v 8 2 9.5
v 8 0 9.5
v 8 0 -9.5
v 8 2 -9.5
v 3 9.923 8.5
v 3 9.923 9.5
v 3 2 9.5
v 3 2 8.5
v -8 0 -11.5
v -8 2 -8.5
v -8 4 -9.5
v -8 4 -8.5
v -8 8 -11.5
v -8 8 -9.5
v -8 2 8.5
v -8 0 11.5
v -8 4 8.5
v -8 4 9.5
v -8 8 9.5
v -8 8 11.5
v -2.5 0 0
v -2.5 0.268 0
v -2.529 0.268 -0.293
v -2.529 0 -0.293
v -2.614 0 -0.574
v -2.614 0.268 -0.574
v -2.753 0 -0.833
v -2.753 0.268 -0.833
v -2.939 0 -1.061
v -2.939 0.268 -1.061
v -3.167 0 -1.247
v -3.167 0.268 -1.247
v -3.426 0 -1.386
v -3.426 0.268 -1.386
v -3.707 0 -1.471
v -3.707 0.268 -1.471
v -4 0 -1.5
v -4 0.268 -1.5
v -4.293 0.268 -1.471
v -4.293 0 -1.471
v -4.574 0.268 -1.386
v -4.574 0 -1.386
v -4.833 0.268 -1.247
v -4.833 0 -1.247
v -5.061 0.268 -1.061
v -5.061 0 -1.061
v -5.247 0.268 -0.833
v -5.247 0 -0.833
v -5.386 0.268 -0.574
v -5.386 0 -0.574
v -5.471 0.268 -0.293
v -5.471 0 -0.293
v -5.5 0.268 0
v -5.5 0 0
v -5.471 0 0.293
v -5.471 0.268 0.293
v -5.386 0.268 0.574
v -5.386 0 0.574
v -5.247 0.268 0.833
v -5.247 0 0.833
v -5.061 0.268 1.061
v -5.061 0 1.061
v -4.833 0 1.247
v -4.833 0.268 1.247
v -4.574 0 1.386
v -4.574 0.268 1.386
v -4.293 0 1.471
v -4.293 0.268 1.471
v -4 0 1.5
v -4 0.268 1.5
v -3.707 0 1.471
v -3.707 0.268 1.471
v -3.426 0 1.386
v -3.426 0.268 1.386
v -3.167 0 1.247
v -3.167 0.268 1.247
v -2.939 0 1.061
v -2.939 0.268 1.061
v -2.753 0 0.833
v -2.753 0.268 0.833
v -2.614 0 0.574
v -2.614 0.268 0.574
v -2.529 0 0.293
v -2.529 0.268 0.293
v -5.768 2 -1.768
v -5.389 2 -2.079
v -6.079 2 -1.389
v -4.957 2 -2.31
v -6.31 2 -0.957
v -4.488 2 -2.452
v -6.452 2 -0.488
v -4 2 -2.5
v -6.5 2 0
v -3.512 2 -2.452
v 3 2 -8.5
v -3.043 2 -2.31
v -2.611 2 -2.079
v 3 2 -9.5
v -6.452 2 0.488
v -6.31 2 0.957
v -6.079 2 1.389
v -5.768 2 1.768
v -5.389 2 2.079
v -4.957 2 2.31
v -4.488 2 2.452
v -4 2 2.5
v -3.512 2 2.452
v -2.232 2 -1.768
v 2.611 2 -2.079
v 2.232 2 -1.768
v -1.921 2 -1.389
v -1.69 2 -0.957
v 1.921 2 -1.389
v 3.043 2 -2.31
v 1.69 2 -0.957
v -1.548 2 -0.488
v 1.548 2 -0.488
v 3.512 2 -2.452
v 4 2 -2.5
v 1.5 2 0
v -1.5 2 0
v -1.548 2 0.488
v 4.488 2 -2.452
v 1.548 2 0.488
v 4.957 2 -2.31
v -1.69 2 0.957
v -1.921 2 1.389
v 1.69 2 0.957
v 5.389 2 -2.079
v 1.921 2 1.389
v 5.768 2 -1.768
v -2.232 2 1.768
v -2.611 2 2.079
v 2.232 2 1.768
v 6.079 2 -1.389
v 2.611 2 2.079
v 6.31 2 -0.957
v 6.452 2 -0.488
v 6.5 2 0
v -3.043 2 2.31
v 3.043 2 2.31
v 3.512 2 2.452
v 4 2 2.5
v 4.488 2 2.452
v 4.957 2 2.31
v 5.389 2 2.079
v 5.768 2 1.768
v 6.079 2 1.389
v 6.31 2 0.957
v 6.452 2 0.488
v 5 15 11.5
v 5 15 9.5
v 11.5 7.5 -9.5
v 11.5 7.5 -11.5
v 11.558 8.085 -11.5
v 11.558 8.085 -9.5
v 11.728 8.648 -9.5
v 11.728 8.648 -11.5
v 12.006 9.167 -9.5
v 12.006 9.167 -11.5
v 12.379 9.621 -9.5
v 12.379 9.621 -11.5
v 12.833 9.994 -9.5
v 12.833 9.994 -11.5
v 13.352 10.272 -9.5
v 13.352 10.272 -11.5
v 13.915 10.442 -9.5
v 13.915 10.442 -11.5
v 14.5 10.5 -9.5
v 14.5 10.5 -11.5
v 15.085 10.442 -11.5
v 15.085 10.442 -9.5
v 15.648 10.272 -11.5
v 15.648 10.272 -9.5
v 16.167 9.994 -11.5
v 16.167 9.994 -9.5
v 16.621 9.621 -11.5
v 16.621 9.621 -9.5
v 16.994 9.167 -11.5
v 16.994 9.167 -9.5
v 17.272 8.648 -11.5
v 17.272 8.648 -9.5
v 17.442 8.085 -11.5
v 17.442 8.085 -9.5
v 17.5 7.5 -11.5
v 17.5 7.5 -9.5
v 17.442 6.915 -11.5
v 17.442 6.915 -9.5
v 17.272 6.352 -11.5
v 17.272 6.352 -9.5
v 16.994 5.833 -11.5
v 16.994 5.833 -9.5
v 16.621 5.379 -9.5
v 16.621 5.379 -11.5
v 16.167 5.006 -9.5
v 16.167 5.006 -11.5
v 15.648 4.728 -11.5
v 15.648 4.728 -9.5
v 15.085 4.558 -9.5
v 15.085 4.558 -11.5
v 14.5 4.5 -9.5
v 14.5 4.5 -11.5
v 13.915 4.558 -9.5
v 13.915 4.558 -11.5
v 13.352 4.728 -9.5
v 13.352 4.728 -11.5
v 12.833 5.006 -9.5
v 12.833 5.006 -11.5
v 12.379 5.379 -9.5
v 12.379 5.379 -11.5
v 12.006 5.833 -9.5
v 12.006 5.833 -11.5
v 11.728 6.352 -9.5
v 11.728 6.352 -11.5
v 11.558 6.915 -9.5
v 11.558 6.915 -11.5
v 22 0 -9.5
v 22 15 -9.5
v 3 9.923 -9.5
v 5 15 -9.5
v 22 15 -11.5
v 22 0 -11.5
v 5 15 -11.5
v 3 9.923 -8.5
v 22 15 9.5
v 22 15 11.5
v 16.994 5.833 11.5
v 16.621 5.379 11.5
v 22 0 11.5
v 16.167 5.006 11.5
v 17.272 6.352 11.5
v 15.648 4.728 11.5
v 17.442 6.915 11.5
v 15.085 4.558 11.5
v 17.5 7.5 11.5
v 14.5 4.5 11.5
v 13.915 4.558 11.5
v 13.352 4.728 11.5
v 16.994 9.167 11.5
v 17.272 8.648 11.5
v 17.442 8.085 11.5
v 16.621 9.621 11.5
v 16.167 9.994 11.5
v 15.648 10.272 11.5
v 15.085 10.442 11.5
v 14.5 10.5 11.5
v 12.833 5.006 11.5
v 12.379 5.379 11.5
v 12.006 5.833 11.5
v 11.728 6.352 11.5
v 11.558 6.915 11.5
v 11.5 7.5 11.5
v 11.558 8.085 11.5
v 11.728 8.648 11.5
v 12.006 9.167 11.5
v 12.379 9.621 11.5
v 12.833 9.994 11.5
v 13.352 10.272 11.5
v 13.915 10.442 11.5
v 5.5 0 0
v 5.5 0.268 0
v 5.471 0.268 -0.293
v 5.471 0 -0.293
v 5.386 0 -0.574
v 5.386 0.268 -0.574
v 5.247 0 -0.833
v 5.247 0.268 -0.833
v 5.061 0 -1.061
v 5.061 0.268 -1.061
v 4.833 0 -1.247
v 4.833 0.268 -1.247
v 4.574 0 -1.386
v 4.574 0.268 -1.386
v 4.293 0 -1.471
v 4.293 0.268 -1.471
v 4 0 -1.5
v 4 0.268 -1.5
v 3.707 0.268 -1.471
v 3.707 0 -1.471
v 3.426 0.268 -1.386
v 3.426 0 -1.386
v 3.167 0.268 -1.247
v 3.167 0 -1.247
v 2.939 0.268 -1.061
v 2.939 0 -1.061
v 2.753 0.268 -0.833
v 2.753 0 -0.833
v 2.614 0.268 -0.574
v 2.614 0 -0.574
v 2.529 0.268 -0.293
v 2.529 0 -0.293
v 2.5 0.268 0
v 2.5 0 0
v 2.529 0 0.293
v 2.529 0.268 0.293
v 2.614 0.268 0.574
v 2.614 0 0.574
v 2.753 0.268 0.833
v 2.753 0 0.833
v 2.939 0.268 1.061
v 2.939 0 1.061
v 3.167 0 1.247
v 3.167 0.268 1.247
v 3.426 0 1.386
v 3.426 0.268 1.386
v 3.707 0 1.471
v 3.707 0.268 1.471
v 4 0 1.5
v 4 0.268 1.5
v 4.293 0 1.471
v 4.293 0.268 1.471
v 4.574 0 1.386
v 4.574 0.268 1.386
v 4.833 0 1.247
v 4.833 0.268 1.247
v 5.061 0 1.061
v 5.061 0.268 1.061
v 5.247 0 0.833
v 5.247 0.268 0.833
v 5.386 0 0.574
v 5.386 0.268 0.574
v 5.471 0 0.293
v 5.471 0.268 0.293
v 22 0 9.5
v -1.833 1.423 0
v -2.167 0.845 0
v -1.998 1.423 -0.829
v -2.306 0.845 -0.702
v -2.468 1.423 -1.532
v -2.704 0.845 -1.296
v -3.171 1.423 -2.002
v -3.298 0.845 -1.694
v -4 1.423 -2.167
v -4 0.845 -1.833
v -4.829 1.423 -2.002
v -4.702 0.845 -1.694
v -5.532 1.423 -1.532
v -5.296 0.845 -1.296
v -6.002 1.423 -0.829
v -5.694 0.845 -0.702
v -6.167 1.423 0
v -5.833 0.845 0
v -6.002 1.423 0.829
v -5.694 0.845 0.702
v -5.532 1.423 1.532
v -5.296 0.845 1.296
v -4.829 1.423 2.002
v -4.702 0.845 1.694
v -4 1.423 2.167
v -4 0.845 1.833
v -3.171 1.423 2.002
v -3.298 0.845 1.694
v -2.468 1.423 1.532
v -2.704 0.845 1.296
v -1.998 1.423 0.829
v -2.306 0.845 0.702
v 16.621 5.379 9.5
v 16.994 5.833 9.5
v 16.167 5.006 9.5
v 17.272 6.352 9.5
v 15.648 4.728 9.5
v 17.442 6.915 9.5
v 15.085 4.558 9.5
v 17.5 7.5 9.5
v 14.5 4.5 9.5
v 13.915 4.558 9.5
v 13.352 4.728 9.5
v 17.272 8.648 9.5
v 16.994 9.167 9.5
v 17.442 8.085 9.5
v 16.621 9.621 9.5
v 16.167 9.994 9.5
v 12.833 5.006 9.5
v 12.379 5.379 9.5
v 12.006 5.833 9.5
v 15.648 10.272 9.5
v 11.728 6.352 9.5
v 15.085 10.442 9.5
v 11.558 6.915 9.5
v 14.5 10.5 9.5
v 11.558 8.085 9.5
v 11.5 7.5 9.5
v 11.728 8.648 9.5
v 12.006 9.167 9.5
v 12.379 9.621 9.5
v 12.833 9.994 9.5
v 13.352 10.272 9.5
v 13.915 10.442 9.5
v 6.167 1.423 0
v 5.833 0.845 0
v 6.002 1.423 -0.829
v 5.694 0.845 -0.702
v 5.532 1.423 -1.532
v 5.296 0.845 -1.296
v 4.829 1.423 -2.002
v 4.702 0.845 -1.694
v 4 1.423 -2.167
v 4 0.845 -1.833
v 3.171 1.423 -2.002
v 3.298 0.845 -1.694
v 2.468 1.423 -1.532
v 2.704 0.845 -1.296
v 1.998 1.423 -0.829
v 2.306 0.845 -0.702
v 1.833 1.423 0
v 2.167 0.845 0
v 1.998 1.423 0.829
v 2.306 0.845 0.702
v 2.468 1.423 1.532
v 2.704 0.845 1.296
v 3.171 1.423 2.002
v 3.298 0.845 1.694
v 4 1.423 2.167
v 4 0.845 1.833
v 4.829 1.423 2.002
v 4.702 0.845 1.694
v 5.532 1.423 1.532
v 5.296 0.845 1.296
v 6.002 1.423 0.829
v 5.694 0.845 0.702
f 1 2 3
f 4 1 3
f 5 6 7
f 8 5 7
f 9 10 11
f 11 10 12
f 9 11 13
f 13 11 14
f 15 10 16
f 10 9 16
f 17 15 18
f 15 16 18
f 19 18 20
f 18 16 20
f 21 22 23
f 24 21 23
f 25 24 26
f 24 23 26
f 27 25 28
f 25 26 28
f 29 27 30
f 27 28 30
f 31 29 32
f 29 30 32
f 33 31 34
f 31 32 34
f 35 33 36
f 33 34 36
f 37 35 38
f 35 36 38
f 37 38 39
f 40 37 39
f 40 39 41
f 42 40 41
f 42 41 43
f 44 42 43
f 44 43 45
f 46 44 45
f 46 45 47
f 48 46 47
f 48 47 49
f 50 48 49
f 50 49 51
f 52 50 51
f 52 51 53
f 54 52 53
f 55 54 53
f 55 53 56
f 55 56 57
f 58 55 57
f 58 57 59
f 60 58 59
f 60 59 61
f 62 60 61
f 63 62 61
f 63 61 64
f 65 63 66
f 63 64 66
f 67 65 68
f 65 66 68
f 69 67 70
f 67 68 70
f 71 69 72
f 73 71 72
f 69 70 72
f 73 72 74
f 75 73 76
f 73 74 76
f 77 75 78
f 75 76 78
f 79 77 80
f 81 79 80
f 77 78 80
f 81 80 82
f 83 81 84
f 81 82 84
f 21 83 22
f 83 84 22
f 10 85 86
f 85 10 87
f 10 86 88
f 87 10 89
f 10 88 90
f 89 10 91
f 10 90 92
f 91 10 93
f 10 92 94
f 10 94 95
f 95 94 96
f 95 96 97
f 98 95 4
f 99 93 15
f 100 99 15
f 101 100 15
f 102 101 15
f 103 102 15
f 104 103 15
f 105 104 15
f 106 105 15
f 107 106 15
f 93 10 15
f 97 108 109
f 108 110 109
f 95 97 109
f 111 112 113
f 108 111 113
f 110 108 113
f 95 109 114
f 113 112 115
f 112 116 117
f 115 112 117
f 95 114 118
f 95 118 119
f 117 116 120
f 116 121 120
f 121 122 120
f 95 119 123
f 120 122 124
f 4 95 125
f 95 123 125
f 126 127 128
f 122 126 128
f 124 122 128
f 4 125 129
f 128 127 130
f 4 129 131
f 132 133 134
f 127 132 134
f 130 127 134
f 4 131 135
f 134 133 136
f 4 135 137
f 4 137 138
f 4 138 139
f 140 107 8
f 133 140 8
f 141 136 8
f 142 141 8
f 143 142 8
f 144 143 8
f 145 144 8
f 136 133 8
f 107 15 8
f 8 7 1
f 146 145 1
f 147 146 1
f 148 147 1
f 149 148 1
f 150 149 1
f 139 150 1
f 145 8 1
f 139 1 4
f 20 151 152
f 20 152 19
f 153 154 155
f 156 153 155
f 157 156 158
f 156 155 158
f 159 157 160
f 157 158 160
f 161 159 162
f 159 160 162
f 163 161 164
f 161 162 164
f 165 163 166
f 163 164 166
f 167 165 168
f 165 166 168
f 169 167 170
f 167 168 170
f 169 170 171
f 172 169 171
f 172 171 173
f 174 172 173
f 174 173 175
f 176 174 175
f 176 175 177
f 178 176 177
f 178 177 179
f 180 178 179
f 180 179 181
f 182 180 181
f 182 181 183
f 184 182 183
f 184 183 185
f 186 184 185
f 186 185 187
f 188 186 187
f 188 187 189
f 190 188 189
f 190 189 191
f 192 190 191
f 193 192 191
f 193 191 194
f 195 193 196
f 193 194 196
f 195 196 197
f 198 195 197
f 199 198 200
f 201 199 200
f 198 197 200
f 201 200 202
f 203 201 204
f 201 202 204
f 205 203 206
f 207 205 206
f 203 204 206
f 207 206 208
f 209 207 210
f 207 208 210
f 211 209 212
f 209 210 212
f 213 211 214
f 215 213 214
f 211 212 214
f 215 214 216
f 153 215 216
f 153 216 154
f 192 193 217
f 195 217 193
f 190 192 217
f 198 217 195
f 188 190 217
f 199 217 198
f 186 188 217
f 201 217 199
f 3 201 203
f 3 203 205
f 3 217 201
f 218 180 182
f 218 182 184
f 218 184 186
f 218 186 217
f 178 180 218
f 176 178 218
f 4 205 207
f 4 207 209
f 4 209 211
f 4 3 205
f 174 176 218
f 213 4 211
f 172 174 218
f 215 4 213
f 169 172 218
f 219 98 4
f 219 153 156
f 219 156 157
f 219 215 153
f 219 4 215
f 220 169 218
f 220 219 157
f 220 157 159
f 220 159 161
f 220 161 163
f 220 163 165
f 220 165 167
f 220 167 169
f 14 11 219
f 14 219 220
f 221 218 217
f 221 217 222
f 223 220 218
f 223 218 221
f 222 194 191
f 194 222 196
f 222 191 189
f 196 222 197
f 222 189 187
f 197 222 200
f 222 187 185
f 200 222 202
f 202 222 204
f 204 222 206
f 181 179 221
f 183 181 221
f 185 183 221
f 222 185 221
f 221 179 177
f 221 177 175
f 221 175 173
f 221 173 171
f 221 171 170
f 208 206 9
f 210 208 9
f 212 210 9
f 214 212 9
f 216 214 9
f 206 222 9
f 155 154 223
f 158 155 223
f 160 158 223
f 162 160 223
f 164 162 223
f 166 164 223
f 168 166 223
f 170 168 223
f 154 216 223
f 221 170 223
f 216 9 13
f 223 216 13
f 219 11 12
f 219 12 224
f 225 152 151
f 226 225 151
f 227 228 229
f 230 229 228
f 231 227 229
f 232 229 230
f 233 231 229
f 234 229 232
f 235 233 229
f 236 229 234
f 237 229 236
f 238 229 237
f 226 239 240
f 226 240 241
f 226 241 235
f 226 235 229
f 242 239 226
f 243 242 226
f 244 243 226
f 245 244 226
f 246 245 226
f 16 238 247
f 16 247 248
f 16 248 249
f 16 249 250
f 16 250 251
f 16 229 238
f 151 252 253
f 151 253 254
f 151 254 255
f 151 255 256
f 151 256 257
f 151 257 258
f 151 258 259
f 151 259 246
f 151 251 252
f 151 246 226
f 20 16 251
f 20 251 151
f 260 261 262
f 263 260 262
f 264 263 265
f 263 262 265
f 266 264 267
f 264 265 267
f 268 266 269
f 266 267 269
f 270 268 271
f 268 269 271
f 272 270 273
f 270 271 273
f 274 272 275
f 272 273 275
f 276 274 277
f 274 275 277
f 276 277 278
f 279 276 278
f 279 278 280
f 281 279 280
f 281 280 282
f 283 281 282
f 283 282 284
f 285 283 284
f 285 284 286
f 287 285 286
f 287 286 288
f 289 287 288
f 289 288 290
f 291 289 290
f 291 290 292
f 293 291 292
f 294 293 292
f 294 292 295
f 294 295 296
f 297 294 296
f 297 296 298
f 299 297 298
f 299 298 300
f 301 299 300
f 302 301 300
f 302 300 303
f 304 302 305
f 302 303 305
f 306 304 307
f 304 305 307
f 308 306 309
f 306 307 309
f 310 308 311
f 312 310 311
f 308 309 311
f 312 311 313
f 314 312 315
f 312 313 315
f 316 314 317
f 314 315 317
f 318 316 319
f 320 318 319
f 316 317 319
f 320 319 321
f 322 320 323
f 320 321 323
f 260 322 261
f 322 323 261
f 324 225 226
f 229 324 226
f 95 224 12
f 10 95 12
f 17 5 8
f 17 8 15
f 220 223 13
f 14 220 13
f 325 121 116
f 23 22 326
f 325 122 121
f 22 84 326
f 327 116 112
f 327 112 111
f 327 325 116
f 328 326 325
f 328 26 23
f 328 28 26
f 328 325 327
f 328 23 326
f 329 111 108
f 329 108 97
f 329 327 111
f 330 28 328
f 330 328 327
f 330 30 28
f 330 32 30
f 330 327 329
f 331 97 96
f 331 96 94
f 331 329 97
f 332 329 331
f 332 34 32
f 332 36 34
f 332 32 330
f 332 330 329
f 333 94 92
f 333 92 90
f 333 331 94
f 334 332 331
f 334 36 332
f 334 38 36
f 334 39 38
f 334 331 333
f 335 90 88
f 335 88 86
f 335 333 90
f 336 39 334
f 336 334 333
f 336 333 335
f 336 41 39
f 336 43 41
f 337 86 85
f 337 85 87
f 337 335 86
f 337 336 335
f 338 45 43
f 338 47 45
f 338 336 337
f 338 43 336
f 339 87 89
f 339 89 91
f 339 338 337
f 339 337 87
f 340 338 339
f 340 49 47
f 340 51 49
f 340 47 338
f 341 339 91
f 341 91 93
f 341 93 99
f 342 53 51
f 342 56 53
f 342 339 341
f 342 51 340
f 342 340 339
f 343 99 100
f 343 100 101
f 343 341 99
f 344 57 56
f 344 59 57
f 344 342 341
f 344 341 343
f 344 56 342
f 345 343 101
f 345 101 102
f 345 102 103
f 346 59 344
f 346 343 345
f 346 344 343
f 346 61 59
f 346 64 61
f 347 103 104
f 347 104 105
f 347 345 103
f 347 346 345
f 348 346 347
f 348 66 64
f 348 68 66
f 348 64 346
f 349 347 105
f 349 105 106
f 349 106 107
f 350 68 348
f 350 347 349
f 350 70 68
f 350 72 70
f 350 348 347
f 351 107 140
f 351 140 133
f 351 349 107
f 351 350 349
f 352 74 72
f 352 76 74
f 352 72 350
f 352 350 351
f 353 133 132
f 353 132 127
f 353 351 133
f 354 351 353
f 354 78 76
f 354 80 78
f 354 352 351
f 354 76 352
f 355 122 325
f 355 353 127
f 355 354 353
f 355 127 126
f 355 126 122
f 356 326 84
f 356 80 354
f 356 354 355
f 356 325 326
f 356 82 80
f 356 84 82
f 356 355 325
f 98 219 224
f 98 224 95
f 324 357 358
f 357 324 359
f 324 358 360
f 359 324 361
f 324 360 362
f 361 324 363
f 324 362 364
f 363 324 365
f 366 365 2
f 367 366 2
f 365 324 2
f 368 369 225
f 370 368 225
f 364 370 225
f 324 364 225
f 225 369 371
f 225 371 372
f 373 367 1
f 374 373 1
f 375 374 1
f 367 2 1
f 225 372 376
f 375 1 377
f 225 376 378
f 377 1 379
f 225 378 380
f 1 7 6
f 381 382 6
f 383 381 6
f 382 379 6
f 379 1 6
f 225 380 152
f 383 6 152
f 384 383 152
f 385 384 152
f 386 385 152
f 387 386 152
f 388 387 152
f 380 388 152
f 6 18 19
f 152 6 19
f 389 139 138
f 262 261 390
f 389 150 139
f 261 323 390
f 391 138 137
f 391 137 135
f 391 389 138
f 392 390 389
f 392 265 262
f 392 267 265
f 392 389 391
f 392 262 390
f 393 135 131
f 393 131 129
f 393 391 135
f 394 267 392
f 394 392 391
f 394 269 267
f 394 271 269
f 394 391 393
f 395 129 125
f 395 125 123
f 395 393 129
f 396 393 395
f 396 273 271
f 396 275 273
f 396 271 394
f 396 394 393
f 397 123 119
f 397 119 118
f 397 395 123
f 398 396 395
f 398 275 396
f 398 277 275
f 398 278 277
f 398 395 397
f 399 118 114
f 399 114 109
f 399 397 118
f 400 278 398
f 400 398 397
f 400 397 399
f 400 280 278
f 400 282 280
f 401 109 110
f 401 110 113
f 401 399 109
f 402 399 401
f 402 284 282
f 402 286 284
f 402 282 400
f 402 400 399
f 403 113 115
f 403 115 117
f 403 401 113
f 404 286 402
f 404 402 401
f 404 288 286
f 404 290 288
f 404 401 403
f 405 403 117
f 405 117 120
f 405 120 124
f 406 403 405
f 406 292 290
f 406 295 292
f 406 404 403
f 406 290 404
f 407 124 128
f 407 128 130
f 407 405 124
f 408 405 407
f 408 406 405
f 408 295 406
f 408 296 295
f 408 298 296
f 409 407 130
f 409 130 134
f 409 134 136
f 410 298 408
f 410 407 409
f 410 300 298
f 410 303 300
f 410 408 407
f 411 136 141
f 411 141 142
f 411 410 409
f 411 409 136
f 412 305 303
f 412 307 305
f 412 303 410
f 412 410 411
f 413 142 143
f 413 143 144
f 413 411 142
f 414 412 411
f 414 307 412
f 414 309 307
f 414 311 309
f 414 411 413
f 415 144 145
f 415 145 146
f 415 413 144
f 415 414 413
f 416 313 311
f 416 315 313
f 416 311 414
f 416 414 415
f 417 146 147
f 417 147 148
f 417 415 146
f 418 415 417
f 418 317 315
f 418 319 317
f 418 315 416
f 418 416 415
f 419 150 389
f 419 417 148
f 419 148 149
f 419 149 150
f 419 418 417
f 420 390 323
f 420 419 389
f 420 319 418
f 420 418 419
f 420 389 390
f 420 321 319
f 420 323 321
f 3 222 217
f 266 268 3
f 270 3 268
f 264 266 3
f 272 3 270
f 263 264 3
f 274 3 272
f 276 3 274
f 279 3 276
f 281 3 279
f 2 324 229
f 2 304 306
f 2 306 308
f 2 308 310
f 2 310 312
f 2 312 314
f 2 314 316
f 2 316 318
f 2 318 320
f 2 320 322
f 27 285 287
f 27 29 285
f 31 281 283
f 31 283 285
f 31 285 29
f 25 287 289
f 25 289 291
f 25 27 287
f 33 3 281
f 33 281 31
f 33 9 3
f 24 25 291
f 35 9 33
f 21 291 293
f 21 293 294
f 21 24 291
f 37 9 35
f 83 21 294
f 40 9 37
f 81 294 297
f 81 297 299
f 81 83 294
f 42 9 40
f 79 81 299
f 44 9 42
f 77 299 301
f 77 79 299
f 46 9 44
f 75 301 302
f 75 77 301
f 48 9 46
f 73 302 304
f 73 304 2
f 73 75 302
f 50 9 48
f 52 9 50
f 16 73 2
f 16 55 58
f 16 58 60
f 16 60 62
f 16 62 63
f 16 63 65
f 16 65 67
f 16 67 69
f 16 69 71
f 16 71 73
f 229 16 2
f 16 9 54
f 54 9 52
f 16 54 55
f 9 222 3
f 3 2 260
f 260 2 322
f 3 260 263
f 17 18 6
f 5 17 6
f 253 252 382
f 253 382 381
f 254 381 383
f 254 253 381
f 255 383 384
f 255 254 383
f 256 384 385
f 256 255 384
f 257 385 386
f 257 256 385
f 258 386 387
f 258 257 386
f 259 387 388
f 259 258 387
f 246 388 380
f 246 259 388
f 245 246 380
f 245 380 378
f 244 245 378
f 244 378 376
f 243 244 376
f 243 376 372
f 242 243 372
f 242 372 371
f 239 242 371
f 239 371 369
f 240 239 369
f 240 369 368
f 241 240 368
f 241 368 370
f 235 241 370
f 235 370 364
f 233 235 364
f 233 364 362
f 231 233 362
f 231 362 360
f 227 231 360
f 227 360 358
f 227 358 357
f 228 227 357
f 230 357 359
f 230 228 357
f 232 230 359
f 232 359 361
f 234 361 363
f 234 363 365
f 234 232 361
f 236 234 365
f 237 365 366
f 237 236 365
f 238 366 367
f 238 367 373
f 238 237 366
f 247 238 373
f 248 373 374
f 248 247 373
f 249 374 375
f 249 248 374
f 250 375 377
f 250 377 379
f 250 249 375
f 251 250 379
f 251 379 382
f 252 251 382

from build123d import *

# Parameters (mm, degrees)
ESQUISSE2_W                  = 16
ESQUISSE2_H                  = 9.5
BOSS_EXTRU_1_DEPTH           = 2
ESQUISSE5_W                  = 16
ESQUISSE5_H                  = 2
BOSS_EXTRU_2_DEPTH           = 15
ENL_V_MAT_EXTRU_1_DEPTH      = 1
ENL_V_MAT_EXTRU_1_DEPTH_BACK = 12.5
ESQUISSE7_W                  = 2
ESQUISSE7_H                  = 15
BOSS_EXTRU_3_DEPTH           = 14
BOSS_EXTRU_4_DEPTH           = 1
ENL_V_MAT_EXTRU_2_REACH      = 13.5
ESQUISSE9_R                  = 3
ENL_V_MAT_EXTRU_3_REACH      = 4
ESQUISSE11_R                 = 1.5
CHANFREIN1_SIZE              = 1
CHANFREIN1_SIZE2             = 1.732050808


with BuildPart() as part:
    # Esquisse2 → Boss.-Extru.1 (new body)
    with BuildSketch(Plane(origin=(0, 0, 0), x_dir=(1, 0, 0), z_dir=(0, 1, 0))):
        with Locations((0, 4.75)):
            Rectangle(ESQUISSE2_W, ESQUISSE2_H)
    extrude(amount=BOSS_EXTRU_1_DEPTH)

    # Esquisse5 → Boss.-Extru.2 (add)
    with BuildSketch(Plane.XZ):
        with Locations((0, -10.5)):
            Rectangle(ESQUISSE5_W, ESQUISSE5_H)
    extrude(amount=-BOSS_EXTRU_2_DEPTH)

    # Esquisse6 → Enlèv. mat.-Extru.1 (cut, two sides)
    with BuildSketch(Plane(origin=(0, 0, -11.5), x_dir=(-1, 0, 0), z_dir=(0, 0, -1))) as enl_v_mat_extru_1_sk:
        Polygon((-48.758415637, 38.562223804), (-5, 15), (8, 8), (51.758415637, -15.562223804), (98.882863246, 71.954607469), (-1.633968028, 126.079055078), align=None)
    extrude(amount=ENL_V_MAT_EXTRU_1_DEPTH, mode=Mode.SUBTRACT)
    extrude(enl_v_mat_extru_1_sk.sketch, amount=-ENL_V_MAT_EXTRU_1_DEPTH_BACK, mode=Mode.SUBTRACT)

    # Esquisse7 → Boss.-Extru.3 (add)
    with BuildSketch(Plane(origin=(8, 0, 0), x_dir=(0, 0, -1), z_dir=(1, 0, 0))):
        with Locations((10.5, 7.5)):
            Rectangle(ESQUISSE7_W, ESQUISSE7_H)
    extrude(amount=BOSS_EXTRU_3_DEPTH)

    # Esquisse8 → Boss.-Extru.4 (add)
    with BuildSketch(Plane.XY.offset(-9.5)):
        Polygon((-8, 2), (-8, 4), (3, 9.923076923), (3, 2), align=None)
    extrude(amount=BOSS_EXTRU_4_DEPTH)

    # Esquisse9 → Enlèv. mat.-Extru.2 (cut, up to next)
    with BuildSketch(Plane(origin=(0, 0, -11.5), x_dir=(-1, 0, 0), z_dir=(0, 0, -1)), mode=Mode.PRIVATE) as enl_v_mat_extru_2_sk1:
        with Locations((-14.5, 7.5)):
            Circle(ESQUISSE9_R)
    enl_v_mat_extru_2_tool1 = extrude(enl_v_mat_extru_2_sk1.sketch, amount=-ENL_V_MAT_EXTRU_2_REACH, mode=Mode.PRIVATE) & part.part
    add(enl_v_mat_extru_2_tool1.solids().sort_by_distance((14.5, 7.5, -11.5))[0], mode=Mode.SUBTRACT)

    # Symétrie1: part across plane


with BuildPart() as part_1:
    add(part.part)
    add(part.part.mirror(Plane(origin=(-8, 2, 0), x_dir=(1, 0, 0), z_dir=(0, 0, -1))))

    # Esquisse11 → Enlèv. mat.-Extru.3 (cut, up to next)
    with BuildSketch(Plane(origin=(0, 2, 0), x_dir=(1, 0, 0), z_dir=(0, 1, 0)), mode=Mode.PRIVATE) as enl_v_mat_extru_3_sk1:
        with Locations((-4, 0)):
            Circle(ESQUISSE11_R)
    enl_v_mat_extru_3_tool1 = extrude(enl_v_mat_extru_3_sk1.sketch, amount=-ENL_V_MAT_EXTRU_3_REACH, mode=Mode.PRIVATE) & part_1.part
    add(enl_v_mat_extru_3_tool1.solids().sort_by_distance((-4, 2, 0))[0], mode=Mode.SUBTRACT)
    # Esquisse11 → Enlèv. mat.-Extru.3 (cut, up to next)
    with BuildSketch(Plane(origin=(0, 2, 0), x_dir=(1, 0, 0), z_dir=(0, 1, 0)), mode=Mode.PRIVATE) as enl_v_mat_extru_3_sk2:
        with Locations((4, 0)):
            Circle(ESQUISSE11_R)
    enl_v_mat_extru_3_tool2 = extrude(enl_v_mat_extru_3_sk2.sketch, amount=-ENL_V_MAT_EXTRU_3_REACH, mode=Mode.PRIVATE) & part_1.part
    add(enl_v_mat_extru_3_tool2.solids().sort_by_distance((4, 2, 0))[0], mode=Mode.SUBTRACT)

    # Chanfrein1
    chanfrein1_edges = [part_1.edges().sort_by_distance(p)[0] for p in [
        (-5.5, 2, 0),
        (2.5, 2, 0),
    ]]
    chanfrein1_side = [part_1.faces().sort_by_distance(p)[0] for p in [
        (0.205328971, 2, 0),
    ]]
    chamfer(chanfrein1_edges, length=CHANFREIN1_SIZE, length2=CHANFREIN1_SIZE2, reference=chanfrein1_side[0])


solid = part_1.part
